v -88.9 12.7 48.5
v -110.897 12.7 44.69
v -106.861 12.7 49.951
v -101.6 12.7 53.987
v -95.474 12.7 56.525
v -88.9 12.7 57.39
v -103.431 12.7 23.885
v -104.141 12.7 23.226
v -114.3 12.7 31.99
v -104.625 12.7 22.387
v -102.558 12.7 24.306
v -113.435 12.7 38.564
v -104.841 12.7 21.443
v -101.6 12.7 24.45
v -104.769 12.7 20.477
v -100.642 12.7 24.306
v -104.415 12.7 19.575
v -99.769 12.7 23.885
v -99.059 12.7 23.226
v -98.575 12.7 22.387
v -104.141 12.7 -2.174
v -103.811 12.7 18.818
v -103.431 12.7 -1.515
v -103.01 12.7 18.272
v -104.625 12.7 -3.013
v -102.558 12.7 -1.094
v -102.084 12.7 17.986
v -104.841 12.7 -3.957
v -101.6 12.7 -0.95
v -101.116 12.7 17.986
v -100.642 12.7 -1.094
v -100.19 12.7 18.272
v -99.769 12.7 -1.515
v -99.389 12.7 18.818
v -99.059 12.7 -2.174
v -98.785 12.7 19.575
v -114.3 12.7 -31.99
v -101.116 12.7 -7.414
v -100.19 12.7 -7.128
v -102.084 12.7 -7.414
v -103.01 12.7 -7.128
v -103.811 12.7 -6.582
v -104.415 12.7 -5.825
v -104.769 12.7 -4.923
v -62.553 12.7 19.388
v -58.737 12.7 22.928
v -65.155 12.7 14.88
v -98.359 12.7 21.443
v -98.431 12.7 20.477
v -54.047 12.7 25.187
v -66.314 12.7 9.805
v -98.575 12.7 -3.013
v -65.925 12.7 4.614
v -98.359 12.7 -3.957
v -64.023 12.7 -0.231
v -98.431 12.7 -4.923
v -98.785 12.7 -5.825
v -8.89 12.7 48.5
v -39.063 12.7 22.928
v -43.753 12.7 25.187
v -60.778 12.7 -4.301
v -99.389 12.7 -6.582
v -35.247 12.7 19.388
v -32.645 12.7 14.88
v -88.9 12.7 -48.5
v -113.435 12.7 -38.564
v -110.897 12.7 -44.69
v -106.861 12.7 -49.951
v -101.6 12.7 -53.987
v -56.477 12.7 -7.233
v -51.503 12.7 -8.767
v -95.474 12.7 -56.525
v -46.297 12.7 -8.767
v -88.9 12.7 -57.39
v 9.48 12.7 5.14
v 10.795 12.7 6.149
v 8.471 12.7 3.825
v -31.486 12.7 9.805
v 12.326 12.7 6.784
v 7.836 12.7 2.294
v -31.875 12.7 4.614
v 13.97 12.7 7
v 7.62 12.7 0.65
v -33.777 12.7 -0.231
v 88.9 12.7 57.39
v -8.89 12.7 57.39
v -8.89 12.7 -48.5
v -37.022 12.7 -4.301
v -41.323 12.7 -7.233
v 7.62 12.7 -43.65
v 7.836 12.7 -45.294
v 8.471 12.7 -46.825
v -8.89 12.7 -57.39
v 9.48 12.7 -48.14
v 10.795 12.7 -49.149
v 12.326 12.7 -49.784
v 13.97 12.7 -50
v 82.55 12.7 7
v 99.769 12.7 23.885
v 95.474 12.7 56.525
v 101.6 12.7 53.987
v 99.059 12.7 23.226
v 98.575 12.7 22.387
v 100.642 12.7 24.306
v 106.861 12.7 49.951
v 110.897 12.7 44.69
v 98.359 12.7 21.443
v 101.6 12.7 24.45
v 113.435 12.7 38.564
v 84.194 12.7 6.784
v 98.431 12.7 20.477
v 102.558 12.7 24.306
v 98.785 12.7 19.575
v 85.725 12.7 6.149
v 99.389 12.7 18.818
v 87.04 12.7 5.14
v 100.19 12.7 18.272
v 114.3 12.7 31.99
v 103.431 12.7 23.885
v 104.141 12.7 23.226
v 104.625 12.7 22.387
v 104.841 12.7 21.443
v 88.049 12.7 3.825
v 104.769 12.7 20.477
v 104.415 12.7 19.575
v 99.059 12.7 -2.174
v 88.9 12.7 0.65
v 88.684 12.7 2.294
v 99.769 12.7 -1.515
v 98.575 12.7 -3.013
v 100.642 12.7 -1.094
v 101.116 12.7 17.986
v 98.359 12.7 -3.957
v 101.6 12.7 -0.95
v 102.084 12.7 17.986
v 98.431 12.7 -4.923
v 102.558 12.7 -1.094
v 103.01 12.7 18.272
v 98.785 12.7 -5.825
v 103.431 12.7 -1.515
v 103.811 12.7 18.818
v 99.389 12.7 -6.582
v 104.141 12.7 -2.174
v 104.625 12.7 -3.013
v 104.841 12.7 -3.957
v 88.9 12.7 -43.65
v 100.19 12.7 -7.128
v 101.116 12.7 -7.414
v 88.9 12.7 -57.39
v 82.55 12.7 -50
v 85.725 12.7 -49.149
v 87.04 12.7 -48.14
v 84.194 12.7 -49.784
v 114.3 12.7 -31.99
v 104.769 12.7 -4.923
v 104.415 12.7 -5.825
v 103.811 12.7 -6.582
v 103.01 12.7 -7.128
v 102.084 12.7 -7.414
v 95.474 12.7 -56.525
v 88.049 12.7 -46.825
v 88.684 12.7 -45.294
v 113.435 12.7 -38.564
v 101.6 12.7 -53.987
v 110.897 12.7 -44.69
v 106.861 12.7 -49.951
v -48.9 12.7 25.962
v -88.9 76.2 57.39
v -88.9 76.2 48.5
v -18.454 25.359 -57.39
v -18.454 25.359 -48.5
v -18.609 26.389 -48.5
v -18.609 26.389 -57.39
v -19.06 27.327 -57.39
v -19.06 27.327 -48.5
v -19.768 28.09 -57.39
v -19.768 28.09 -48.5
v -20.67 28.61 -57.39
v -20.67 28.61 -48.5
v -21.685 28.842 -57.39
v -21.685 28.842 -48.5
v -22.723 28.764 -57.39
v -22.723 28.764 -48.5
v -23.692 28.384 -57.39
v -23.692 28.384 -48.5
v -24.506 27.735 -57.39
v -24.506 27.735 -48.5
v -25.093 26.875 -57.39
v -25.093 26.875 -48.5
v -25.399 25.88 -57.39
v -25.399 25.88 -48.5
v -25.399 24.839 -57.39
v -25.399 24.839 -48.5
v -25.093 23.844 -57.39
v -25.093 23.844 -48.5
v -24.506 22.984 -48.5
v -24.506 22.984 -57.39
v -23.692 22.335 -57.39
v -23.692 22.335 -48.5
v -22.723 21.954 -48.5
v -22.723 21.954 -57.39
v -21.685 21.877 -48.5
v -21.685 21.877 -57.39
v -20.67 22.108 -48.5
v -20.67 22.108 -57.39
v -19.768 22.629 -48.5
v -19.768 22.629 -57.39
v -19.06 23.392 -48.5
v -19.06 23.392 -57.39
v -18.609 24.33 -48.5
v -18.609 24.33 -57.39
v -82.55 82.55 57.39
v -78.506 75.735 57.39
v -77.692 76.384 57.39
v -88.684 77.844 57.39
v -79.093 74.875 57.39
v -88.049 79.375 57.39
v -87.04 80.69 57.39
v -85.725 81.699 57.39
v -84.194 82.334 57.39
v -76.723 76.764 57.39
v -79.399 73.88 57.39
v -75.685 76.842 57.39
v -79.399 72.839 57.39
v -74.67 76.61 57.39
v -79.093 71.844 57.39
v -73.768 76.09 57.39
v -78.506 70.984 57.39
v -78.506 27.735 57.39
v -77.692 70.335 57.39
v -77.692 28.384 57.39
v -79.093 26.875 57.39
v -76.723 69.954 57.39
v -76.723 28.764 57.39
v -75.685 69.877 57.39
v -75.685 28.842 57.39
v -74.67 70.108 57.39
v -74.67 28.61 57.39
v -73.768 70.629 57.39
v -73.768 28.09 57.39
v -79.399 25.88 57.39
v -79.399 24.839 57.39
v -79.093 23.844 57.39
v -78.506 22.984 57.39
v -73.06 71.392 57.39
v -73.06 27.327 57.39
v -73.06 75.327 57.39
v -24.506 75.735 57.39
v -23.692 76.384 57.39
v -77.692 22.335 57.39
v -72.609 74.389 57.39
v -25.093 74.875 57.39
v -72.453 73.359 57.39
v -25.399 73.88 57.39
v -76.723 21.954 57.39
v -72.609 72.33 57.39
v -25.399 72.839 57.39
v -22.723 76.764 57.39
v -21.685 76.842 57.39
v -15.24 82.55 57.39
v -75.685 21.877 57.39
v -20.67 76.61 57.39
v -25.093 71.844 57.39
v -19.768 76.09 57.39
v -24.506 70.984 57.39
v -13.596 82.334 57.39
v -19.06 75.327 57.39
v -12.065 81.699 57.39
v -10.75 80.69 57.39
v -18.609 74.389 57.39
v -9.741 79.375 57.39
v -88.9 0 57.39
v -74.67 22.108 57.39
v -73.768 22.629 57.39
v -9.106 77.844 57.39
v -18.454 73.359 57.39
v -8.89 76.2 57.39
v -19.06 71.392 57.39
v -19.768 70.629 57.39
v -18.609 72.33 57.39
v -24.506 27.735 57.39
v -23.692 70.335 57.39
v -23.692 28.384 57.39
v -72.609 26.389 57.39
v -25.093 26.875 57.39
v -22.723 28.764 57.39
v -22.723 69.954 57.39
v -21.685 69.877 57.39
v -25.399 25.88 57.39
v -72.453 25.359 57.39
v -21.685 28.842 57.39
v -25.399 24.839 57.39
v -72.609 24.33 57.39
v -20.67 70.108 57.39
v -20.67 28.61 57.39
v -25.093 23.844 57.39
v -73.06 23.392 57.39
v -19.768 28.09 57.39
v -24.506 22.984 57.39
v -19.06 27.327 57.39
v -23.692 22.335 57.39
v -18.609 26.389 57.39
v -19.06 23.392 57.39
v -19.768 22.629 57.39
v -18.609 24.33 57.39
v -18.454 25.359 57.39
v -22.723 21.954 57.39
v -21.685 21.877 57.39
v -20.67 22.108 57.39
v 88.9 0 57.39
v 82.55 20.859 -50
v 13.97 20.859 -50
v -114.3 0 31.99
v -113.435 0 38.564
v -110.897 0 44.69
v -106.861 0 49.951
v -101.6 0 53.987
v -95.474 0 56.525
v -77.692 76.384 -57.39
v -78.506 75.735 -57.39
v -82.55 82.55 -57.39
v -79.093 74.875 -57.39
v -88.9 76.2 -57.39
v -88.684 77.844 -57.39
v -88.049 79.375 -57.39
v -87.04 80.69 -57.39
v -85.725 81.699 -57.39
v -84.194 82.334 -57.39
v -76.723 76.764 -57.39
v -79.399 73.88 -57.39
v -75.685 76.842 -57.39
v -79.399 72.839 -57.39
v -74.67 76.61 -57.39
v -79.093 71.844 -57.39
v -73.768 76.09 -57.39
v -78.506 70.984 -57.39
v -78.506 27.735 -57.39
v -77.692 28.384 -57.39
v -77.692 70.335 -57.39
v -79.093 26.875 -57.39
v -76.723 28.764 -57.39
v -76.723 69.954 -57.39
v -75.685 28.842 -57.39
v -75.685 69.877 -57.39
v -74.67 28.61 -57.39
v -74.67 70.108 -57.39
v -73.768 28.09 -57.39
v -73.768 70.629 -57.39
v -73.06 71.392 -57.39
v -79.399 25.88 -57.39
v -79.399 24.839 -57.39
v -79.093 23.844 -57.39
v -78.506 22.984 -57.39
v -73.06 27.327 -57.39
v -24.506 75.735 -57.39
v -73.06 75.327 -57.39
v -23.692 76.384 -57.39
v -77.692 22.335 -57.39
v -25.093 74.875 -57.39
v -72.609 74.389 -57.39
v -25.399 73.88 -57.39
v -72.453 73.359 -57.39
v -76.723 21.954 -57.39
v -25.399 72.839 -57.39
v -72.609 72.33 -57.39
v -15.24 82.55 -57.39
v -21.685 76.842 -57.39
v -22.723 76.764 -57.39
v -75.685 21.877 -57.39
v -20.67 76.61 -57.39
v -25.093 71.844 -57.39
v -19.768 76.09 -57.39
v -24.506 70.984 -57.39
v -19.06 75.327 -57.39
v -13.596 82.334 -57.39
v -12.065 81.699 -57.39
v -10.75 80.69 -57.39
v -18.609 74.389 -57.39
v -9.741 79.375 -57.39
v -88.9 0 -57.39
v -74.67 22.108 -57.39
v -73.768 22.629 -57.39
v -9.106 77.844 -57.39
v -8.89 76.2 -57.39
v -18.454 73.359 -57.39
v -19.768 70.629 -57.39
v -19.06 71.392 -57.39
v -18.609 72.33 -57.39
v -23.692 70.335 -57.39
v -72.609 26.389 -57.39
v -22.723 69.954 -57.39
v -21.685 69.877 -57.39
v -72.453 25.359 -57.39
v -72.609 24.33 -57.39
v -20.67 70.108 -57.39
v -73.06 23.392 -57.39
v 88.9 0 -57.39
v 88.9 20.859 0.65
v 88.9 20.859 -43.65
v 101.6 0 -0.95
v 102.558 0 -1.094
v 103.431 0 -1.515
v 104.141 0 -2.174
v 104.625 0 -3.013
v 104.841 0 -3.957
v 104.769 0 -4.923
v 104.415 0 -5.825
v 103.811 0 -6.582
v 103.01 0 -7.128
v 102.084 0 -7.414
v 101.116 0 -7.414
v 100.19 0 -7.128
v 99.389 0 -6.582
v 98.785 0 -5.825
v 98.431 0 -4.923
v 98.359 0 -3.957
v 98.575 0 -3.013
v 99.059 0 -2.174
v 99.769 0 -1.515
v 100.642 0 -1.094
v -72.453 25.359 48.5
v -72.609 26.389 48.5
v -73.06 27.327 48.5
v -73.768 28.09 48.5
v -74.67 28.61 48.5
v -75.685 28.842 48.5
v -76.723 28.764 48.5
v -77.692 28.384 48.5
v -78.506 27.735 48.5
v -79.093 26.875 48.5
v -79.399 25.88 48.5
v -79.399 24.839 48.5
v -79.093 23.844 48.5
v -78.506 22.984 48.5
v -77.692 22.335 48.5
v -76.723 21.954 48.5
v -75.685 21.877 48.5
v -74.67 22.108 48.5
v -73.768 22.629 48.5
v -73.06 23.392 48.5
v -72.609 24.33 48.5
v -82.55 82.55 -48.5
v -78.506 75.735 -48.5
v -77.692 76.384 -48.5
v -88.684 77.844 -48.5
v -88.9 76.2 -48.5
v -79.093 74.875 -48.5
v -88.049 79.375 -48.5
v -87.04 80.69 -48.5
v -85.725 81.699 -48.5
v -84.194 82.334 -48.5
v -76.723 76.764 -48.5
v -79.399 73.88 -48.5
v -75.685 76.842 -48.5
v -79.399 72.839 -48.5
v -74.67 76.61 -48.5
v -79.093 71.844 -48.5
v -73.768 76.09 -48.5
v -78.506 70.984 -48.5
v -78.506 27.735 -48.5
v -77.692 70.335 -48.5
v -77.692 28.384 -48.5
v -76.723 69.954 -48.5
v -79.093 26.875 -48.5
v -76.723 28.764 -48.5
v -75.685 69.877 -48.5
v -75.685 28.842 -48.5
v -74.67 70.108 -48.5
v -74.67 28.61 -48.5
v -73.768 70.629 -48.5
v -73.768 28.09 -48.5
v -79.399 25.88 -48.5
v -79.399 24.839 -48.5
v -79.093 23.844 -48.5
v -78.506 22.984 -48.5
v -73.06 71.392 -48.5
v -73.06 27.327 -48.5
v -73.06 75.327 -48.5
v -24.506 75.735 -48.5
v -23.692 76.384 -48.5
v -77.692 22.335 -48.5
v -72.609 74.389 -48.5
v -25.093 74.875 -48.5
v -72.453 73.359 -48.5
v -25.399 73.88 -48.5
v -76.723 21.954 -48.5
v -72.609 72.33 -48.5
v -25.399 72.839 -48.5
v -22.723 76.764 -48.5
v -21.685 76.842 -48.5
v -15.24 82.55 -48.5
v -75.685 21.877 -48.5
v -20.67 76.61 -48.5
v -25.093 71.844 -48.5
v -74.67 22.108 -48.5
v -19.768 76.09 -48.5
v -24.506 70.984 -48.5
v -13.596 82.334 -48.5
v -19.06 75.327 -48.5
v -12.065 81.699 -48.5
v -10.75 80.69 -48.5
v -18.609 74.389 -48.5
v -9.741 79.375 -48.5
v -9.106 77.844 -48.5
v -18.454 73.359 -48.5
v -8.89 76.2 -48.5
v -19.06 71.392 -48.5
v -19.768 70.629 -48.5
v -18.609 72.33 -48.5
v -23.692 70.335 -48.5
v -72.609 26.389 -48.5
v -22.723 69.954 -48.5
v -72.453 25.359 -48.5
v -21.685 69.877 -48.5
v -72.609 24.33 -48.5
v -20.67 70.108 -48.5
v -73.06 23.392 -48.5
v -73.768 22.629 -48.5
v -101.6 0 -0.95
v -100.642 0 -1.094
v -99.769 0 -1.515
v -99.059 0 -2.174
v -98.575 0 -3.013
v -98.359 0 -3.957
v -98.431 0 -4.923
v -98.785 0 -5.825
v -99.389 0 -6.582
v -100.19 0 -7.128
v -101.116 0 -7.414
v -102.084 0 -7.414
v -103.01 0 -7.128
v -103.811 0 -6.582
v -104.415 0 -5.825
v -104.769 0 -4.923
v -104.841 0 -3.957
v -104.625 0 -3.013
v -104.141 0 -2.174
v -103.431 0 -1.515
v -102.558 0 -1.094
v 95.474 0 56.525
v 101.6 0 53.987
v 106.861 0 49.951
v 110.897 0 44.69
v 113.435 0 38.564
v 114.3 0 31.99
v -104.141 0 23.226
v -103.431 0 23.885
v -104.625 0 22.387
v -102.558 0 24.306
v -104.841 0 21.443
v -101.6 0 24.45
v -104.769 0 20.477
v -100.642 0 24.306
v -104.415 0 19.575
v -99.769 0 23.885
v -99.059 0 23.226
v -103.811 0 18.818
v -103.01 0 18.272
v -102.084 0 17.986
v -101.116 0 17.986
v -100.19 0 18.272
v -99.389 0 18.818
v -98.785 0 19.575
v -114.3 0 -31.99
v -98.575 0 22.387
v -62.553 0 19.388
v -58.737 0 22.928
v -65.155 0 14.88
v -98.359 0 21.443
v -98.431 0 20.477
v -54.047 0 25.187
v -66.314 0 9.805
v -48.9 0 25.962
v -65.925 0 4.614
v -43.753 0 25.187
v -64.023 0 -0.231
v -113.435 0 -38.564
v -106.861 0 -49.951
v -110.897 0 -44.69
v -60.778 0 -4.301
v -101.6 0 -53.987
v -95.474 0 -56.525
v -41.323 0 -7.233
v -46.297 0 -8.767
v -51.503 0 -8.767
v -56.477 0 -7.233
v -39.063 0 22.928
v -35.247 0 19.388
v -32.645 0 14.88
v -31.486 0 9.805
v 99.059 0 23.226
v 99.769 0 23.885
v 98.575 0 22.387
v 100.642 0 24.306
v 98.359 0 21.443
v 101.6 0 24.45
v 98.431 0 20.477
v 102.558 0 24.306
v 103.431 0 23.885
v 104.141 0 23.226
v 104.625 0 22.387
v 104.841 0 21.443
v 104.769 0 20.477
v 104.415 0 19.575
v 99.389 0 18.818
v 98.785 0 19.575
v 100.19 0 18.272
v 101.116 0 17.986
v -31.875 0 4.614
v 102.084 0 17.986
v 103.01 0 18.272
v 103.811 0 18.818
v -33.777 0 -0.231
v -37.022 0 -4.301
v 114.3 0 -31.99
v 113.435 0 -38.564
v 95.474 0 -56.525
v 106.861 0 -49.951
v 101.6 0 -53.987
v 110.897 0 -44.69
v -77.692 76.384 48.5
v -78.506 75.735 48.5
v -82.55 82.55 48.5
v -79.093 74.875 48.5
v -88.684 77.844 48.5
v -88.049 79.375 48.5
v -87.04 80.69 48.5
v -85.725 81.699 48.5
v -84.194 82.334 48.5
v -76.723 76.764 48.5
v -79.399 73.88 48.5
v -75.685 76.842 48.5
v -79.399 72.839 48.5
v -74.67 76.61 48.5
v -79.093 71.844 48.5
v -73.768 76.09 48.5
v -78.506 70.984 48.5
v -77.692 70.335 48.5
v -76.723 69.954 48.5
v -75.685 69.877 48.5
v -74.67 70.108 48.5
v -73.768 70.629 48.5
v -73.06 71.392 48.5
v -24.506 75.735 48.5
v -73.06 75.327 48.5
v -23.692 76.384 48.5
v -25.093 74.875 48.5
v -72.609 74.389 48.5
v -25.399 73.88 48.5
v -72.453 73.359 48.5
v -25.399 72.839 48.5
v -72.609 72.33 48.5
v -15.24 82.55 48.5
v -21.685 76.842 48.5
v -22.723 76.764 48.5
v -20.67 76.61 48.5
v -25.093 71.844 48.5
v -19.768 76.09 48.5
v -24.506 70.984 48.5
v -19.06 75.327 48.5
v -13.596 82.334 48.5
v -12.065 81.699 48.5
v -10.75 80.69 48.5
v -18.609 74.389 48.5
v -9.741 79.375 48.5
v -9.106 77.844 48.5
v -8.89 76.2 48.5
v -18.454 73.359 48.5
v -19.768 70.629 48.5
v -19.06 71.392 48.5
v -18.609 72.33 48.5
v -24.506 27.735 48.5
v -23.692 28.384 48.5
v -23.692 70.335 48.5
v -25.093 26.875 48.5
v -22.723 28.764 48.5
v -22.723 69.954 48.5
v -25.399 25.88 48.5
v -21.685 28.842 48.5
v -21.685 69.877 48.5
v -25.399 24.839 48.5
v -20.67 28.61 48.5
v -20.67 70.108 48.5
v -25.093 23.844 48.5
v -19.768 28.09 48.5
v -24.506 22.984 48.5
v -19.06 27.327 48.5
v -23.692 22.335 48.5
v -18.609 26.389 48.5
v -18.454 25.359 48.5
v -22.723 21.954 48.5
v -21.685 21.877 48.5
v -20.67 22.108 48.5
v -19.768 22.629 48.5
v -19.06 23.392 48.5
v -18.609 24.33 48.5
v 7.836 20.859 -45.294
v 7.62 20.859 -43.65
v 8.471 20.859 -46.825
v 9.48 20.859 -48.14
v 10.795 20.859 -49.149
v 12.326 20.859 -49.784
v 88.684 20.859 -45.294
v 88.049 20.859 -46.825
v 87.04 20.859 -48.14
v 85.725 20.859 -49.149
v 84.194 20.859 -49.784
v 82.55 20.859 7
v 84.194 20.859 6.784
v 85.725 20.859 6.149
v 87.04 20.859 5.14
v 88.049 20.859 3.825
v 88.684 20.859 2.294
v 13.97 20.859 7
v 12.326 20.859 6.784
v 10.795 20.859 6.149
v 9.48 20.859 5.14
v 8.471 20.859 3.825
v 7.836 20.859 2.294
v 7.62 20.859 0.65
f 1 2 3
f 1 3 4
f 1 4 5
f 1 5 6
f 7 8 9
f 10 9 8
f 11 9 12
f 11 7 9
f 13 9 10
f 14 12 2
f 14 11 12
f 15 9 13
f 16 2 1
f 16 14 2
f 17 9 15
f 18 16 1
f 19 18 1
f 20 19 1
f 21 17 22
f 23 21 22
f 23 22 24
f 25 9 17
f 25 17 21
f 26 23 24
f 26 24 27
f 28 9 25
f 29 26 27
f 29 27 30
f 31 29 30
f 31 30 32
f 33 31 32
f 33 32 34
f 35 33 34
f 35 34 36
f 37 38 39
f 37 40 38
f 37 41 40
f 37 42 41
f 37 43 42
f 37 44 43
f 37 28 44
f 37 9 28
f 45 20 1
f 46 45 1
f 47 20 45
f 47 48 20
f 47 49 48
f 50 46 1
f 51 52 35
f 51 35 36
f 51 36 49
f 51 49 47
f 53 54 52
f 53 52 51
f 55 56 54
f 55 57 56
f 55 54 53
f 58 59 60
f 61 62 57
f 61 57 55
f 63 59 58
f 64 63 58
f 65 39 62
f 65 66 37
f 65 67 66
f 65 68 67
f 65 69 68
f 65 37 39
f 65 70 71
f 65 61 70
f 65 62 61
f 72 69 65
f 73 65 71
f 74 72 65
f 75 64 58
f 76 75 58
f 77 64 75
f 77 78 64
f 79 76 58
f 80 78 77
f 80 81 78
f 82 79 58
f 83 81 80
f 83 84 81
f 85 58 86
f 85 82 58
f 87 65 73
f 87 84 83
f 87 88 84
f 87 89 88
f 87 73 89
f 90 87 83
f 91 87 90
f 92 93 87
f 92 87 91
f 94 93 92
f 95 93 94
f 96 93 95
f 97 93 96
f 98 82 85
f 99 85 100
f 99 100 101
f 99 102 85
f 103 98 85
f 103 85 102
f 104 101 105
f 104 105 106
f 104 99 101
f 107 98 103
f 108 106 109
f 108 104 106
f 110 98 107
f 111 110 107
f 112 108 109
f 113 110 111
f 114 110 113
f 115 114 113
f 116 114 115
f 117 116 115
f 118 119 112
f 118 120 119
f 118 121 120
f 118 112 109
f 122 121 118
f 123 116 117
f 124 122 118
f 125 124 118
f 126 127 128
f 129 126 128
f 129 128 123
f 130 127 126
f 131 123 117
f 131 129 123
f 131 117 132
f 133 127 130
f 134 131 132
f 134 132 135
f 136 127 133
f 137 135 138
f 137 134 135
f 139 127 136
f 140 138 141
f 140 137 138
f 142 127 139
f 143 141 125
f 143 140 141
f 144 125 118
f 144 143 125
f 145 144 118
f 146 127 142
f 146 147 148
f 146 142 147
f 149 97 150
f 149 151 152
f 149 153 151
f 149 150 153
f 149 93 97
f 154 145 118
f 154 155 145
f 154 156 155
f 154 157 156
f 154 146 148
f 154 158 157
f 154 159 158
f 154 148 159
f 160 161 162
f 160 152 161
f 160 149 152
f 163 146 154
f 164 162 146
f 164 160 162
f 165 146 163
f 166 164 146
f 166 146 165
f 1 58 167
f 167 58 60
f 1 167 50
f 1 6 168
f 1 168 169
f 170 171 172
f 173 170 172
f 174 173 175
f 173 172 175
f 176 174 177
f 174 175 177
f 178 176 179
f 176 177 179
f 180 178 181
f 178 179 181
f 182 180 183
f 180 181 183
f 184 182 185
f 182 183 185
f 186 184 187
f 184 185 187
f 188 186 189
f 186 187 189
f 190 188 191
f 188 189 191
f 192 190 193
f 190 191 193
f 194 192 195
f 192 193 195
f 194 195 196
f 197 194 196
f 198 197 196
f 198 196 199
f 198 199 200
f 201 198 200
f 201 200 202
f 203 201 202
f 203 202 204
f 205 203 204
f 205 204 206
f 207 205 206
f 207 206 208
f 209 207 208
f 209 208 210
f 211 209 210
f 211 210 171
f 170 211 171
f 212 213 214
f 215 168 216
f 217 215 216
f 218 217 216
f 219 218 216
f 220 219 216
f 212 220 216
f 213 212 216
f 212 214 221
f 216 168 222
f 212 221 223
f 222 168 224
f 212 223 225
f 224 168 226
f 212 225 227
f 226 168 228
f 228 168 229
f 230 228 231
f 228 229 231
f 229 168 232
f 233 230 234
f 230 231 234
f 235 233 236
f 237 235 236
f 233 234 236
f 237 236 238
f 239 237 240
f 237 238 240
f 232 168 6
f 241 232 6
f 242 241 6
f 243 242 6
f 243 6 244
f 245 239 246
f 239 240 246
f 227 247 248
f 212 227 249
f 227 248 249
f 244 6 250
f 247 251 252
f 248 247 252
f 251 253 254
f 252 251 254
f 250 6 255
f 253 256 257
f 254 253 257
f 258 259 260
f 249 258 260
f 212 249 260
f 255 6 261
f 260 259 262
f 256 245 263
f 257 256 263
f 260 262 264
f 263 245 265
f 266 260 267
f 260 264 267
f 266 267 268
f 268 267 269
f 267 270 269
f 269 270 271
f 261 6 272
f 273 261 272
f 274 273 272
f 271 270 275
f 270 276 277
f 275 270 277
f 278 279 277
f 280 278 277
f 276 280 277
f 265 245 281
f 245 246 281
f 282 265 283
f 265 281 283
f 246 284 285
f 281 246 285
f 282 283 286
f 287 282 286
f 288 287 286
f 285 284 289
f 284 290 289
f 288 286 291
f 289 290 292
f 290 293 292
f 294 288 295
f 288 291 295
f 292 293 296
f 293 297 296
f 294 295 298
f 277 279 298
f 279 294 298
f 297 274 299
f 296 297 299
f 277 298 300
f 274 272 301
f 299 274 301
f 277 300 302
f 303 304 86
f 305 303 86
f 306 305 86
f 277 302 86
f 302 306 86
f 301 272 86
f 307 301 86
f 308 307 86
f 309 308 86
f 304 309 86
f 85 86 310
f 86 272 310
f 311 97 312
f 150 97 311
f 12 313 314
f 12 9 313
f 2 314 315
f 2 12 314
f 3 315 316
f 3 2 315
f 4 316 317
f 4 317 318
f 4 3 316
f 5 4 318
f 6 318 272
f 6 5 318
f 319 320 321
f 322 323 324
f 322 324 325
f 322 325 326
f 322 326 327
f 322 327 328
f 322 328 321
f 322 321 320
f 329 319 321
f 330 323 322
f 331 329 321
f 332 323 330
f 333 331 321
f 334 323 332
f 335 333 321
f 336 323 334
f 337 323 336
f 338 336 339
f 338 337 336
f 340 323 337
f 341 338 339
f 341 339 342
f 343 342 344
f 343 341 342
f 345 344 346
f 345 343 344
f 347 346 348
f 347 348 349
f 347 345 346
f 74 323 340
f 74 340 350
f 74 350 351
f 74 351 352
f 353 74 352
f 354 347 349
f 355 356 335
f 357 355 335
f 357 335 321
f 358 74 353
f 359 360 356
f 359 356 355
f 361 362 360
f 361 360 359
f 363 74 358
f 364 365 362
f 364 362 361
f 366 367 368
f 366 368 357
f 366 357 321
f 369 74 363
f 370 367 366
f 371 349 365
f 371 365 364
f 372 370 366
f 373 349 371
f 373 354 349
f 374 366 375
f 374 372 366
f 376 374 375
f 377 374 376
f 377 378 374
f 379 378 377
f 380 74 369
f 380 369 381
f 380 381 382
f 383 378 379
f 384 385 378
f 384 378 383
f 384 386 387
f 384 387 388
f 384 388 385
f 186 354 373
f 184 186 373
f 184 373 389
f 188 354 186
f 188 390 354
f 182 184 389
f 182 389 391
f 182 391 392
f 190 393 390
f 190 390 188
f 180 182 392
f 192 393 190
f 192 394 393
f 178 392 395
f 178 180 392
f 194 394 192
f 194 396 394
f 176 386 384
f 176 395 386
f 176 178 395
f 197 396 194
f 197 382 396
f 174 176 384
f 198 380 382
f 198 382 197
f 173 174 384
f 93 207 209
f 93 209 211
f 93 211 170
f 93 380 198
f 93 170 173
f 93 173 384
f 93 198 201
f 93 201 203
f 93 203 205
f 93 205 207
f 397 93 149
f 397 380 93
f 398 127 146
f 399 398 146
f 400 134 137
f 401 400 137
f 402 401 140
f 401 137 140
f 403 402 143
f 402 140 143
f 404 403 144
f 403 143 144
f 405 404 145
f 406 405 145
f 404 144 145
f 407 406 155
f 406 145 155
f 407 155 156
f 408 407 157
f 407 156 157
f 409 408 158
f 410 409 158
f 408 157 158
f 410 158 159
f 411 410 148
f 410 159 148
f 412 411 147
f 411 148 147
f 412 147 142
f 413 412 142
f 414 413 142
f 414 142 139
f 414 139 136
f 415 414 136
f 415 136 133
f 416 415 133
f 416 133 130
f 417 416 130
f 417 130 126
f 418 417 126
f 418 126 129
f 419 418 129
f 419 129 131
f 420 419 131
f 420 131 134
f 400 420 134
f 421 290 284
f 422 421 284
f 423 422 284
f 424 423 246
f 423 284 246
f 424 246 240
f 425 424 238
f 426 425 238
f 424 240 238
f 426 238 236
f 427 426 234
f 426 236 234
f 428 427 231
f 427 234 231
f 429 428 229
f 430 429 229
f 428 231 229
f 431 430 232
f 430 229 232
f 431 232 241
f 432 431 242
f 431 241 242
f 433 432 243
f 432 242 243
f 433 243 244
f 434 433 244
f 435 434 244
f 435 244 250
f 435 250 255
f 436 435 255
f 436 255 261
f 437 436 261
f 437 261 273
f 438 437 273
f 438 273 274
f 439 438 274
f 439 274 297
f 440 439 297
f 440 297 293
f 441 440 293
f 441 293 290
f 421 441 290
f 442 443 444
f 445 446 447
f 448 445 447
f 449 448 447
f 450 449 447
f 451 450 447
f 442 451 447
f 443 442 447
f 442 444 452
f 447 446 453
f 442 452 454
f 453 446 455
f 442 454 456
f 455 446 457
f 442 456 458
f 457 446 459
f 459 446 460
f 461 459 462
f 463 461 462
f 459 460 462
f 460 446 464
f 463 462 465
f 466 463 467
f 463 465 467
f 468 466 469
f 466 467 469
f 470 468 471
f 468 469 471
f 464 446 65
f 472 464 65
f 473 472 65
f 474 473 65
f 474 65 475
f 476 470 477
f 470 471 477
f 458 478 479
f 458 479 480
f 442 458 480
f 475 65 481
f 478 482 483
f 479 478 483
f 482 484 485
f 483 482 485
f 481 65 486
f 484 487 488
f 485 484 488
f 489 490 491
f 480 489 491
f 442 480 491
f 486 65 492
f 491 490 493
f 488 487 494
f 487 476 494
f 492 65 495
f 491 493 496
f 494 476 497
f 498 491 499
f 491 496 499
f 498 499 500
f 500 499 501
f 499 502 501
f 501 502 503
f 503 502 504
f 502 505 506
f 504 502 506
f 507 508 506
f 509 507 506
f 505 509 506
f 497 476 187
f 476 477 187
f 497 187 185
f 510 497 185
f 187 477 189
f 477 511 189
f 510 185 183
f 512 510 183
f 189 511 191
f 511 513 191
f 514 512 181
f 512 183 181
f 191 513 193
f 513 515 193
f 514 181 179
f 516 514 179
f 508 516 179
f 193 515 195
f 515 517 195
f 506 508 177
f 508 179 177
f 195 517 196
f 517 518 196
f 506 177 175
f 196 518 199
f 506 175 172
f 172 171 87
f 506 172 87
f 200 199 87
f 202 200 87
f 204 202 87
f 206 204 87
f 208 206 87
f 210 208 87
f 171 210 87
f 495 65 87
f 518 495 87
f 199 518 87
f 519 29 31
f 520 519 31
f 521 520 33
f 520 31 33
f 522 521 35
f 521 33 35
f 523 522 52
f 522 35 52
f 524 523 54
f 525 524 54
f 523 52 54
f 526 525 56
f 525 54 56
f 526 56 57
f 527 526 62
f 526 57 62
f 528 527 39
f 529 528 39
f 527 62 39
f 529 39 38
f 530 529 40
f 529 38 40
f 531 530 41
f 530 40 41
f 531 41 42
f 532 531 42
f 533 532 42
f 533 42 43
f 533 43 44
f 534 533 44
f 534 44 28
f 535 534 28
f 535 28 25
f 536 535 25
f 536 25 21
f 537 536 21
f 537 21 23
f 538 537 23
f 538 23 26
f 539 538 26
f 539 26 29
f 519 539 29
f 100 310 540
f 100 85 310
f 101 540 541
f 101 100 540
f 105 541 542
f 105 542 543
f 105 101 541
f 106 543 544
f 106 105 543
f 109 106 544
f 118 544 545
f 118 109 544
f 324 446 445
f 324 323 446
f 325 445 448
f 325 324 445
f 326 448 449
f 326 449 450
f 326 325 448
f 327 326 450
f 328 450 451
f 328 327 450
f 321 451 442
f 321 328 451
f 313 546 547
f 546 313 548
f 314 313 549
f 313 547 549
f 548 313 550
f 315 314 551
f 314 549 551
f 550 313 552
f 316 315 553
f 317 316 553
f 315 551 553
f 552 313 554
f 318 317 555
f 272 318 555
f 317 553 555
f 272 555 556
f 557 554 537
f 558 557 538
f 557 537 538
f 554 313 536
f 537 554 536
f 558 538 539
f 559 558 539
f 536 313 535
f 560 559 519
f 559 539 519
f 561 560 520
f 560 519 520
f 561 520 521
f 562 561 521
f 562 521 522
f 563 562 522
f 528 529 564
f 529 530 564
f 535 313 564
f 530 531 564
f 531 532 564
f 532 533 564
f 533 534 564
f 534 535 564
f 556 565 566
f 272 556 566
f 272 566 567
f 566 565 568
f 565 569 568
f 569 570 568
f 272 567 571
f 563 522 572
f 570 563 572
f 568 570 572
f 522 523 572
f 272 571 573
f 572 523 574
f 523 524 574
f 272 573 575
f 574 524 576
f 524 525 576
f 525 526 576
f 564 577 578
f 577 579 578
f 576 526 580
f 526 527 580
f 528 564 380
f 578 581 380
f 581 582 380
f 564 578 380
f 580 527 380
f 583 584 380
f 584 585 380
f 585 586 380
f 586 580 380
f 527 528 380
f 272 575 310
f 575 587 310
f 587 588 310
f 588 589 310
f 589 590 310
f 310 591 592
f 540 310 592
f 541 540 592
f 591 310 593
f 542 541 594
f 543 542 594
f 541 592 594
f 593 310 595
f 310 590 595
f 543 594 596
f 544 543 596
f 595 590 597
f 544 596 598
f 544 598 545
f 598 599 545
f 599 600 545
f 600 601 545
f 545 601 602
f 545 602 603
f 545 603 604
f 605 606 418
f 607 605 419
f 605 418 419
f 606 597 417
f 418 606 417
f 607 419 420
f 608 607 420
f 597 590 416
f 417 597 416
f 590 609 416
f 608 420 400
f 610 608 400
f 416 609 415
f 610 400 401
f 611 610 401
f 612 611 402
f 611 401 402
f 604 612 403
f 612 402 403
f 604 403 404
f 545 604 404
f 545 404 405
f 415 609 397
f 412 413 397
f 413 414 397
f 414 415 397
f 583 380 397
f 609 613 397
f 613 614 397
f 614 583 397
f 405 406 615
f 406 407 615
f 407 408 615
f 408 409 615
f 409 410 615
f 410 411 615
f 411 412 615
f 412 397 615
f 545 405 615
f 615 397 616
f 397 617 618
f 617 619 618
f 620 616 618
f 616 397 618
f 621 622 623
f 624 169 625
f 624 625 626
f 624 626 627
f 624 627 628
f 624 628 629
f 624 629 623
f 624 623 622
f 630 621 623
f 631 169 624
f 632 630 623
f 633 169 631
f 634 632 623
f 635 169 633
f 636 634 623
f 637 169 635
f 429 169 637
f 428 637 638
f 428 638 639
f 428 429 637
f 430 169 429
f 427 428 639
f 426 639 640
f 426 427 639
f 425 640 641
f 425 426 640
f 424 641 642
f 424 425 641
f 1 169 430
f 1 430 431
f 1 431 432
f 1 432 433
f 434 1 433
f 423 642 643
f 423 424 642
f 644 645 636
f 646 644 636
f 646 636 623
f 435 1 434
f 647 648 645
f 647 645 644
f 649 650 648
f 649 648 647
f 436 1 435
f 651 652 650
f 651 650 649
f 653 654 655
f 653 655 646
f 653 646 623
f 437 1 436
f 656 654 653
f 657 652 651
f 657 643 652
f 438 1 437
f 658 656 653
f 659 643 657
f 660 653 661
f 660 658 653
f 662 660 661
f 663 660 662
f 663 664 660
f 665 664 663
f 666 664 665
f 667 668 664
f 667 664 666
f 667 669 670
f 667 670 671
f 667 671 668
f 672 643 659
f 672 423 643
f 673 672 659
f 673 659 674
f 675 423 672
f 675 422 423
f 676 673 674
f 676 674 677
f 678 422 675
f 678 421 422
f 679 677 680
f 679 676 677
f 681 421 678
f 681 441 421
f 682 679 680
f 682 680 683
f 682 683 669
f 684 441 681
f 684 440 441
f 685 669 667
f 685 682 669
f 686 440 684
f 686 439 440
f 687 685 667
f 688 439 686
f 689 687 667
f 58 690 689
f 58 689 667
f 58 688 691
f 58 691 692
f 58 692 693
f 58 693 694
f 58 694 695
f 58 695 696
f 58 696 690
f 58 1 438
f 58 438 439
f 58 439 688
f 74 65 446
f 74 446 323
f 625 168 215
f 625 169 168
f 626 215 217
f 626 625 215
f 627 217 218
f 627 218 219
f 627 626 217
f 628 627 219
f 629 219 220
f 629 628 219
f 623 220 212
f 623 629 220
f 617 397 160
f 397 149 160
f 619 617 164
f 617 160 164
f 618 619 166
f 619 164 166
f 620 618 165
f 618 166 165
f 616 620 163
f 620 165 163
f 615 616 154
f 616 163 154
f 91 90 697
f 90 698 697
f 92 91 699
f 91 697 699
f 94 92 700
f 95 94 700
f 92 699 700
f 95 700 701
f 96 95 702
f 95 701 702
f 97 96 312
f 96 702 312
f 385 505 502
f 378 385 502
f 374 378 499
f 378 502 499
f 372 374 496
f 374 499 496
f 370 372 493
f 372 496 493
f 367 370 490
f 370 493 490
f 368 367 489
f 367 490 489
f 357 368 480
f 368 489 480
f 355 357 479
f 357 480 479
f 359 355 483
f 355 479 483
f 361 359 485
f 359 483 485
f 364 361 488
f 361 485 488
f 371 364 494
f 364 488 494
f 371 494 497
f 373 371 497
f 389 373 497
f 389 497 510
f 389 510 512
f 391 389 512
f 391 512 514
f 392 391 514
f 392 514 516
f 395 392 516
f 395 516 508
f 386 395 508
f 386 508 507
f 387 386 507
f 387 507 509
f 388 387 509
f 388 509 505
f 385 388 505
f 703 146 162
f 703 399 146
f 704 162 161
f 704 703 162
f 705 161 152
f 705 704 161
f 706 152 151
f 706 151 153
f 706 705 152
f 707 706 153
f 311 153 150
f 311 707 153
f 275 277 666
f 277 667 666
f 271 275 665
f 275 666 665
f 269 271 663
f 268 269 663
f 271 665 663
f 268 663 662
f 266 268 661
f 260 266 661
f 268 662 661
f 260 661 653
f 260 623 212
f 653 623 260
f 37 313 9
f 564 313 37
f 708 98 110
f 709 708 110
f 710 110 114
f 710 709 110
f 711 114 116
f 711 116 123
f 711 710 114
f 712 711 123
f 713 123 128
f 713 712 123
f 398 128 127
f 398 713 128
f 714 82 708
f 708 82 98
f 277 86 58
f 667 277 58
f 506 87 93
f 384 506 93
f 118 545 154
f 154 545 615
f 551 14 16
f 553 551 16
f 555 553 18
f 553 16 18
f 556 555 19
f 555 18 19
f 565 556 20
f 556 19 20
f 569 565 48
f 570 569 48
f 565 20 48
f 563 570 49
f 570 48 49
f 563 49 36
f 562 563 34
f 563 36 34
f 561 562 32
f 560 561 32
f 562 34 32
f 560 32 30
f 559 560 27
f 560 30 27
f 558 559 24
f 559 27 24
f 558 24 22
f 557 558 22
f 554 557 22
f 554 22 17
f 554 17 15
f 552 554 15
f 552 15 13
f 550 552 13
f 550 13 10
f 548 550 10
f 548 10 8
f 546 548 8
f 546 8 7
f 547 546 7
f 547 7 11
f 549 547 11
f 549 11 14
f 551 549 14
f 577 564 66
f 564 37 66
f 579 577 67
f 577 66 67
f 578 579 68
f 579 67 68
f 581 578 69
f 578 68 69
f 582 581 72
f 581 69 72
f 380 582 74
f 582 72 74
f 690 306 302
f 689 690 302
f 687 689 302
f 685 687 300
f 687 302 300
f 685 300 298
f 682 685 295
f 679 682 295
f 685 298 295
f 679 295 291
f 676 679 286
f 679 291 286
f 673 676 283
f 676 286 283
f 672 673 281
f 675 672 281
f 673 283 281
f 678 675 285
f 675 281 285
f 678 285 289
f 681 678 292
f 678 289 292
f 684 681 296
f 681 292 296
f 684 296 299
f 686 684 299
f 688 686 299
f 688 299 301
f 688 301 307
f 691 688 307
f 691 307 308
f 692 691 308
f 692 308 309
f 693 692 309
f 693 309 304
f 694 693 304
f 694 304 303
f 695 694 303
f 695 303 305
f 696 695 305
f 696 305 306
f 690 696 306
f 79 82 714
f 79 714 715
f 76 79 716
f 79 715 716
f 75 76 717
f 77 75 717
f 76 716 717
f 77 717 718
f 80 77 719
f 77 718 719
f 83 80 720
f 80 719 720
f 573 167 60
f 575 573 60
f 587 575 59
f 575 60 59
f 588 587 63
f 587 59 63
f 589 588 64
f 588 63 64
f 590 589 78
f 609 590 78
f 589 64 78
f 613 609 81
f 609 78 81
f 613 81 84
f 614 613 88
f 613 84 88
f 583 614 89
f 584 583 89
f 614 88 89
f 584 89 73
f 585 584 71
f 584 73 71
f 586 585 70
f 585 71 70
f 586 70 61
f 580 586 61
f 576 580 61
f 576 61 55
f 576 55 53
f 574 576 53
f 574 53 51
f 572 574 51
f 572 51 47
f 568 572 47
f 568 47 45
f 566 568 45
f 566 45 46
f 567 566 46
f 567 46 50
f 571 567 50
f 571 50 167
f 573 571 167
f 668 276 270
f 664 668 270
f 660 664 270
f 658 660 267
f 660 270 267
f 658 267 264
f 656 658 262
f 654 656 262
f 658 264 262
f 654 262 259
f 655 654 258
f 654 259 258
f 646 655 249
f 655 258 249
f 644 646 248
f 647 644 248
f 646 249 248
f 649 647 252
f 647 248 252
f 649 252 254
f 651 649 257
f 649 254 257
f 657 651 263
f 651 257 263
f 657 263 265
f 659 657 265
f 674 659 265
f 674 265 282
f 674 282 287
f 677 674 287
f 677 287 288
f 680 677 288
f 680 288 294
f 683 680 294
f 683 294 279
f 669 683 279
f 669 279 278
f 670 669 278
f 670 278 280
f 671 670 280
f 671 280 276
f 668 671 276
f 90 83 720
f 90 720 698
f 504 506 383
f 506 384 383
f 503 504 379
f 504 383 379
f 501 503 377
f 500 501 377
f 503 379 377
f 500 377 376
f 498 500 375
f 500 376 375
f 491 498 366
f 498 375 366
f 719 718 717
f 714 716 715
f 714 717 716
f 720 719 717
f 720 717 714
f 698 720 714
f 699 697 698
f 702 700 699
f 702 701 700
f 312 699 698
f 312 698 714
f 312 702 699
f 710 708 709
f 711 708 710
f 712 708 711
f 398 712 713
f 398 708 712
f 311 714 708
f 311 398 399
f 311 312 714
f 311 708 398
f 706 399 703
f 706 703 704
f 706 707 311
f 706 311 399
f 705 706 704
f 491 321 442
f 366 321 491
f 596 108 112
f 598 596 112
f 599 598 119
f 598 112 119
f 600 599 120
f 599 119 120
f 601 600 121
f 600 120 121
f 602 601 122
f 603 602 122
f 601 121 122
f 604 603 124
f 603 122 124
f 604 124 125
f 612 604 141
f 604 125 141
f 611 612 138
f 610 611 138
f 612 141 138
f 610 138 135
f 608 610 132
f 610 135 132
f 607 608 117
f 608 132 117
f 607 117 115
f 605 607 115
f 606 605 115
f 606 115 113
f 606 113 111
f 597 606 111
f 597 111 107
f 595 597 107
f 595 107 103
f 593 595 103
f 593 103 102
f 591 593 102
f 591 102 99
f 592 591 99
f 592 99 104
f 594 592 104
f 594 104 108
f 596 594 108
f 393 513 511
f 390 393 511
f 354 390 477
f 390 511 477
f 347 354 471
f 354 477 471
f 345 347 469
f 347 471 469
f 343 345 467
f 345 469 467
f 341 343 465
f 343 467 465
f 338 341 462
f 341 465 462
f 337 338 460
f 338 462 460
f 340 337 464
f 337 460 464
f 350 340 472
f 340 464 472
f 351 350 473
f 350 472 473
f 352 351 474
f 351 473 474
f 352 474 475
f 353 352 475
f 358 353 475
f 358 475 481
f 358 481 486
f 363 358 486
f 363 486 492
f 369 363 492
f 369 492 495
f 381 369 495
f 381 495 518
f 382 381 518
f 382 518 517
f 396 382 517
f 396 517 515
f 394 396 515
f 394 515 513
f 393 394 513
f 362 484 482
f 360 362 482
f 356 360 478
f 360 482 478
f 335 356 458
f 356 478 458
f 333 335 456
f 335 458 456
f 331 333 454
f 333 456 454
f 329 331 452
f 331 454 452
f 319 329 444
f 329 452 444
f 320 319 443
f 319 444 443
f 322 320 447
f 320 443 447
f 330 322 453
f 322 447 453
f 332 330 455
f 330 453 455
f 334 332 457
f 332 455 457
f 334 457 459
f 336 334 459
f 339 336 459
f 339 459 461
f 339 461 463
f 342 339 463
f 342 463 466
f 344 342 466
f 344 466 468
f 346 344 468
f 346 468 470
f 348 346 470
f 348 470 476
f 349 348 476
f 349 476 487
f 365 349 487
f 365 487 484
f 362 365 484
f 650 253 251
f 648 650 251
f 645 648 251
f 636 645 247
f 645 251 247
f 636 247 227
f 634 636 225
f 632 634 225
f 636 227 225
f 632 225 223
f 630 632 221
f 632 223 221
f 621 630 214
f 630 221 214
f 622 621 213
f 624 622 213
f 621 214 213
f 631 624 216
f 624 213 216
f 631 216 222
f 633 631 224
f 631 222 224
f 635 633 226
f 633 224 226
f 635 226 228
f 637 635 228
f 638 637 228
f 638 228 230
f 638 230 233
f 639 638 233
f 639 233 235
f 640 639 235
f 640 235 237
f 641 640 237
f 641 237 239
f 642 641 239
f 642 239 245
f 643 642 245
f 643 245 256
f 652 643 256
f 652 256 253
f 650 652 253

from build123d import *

# Parameters (mm, degrees)
SKETCH1_W           = 228.6
SKETCH1_H           = 114.78
BOSS_EXTRUDE1_DEPTH = 12.7
SKETCH2_W           = 80.01
SKETCH2_H           = 8.89
BOSS_EXTRUDE2_DEPTH = 69.85
SKETCH3_W           = 81.28
SKETCH3_H           = 57
BOSS_EXTRUDE3_DEPTH = 8.159375
SKETCH4_R           = 17.4625
CUT_EXTRUDE1_DEPTH  = 146.729628422
SKETCH5_R           = 3.4925
CUT_EXTRUDE2_DEPTH  = 182.80605298
SKETCH6_R           = 17.4625
SKETCH6_R_2         = 3.25
CUT_EXTRUDE3_DEPTH  = 146.729628422
FILLET1_R           = 25.4
FILLET2_R           = 6.35
FILLET3_R           = 6.35


with BuildPart() as part:
    # Sketch1 → Boss-Extrude1 (new body)
    with BuildSketch(Plane(origin=(0, 0, 0), x_dir=(1, 0, 0), z_dir=(0, 1, 0))):
        Rectangle(SKETCH1_W, SKETCH1_H)
    extrude(amount=BOSS_EXTRUDE1_DEPTH)

    # Sketch2 → Boss-Extrude2 (add)
    with BuildSketch(Plane(origin=(0, 12.7, 0), x_dir=(1, 0, 0), z_dir=(0, 1, 0))):
        with Locations((-48.895, 52.945)):
            Rectangle(SKETCH2_W, SKETCH2_H)
        with Locations((-48.895, -52.945)):
            Rectangle(SKETCH2_W, SKETCH2_H)
    extrude(amount=BOSS_EXTRUDE2_DEPTH)

    # Sketch3 → Boss-Extrude3 (add)
    with BuildSketch(Plane(origin=(0, 12.7, 0), x_dir=(1, 0, 0), z_dir=(0, 1, 0))):
        with Locations((48.26, 21.5)):
            Rectangle(SKETCH3_W, SKETCH3_H)
    extrude(amount=BOSS_EXTRUDE3_DEPTH)

    # Sketch4 → Cut-Extrude1 (cut, through all)
    with BuildSketch(Plane(origin=(0, 12.7, 0), x_dir=(1, 0, 0), z_dir=(0, 1, 0))):
        with Locations(Location((-48.9, -8.5, 0), (0, 0, 270))):
            Circle(SKETCH4_R)
    extrude(amount=-CUT_EXTRUDE1_DEPTH, mode=Mode.SUBTRACT)

    # Sketch5 → Cut-Extrude2 (cut, through all)
    with BuildSketch(Plane.XY.offset(57.39)):
        with Locations((-75.946, 73.359375)):
            Circle(SKETCH5_R)
        with Locations((-21.946, 73.359375)):
            Circle(SKETCH5_R)
        with Locations((-75.946, 25.359375)):
            Circle(SKETCH5_R)
        with Locations((-21.946, 25.359375)):
            Circle(SKETCH5_R)
    extrude(amount=-CUT_EXTRUDE2_DEPTH, mode=Mode.SUBTRACT)

    # Sketch6 → Cut-Extrude3 (cut, through all)
    with BuildSketch(Plane(origin=(0, 12.7, 0), x_dir=(1, 0, 0), z_dir=(0, 1, 0))):
        with Locations(Location((-48.9, -8.5, 0), (0, 0, 270))):
            Circle(SKETCH6_R)
        with Locations(Location((-101.6, -21.2, 0), (0, 0, 270))):
            Circle(SKETCH6_R_2)
        with Locations(Location((-101.6, 4.2, 0), (0, 0, 270))):
            Circle(SKETCH6_R_2)
        with Locations(Location((101.6, -21.2, 0), (0, 0, 270))):
            Circle(SKETCH6_R_2)
        with Locations(Location((101.6, 4.2, 0), (0, 0, 270))):
            Circle(SKETCH6_R_2)
    extrude(amount=-CUT_EXTRUDE3_DEPTH, mode=Mode.SUBTRACT)

    # Fillet1
    fillet1_edges = [part.edges().sort_by_distance(p)[0] for p in [
        (114.3, 6.35, 57.39),
        (-114.3, 6.35, 57.39),
        (-114.3, 6.35, -57.39),
        (114.3, 6.35, -57.39),
    ]]
    fillet(fillet1_edges, radius=FILLET1_R)

    # Fillet2
    fillet2_edges = [part.edges().sort_by_distance(p)[0] for p in [
        (-88.9, 82.55, -52.945),
        (-8.89, 82.55, -52.945),
        (-88.9, 82.55, 52.945),
        (-8.89, 82.55, 52.945),
    ]]
    fillet(fillet2_edges, radius=FILLET2_R)

    # Fillet3
    fillet3_edges = [part.edges().sort_by_distance(p)[0] for p in [
        (88.9, 16.7796875, 7),
        (88.9, 16.7796875, -50),
        (7.62, 16.7796875, -50),
        (7.62, 16.7796875, 7),
    ]]
    fillet(fillet3_edges, radius=FILLET3_R)


solid = part.part
